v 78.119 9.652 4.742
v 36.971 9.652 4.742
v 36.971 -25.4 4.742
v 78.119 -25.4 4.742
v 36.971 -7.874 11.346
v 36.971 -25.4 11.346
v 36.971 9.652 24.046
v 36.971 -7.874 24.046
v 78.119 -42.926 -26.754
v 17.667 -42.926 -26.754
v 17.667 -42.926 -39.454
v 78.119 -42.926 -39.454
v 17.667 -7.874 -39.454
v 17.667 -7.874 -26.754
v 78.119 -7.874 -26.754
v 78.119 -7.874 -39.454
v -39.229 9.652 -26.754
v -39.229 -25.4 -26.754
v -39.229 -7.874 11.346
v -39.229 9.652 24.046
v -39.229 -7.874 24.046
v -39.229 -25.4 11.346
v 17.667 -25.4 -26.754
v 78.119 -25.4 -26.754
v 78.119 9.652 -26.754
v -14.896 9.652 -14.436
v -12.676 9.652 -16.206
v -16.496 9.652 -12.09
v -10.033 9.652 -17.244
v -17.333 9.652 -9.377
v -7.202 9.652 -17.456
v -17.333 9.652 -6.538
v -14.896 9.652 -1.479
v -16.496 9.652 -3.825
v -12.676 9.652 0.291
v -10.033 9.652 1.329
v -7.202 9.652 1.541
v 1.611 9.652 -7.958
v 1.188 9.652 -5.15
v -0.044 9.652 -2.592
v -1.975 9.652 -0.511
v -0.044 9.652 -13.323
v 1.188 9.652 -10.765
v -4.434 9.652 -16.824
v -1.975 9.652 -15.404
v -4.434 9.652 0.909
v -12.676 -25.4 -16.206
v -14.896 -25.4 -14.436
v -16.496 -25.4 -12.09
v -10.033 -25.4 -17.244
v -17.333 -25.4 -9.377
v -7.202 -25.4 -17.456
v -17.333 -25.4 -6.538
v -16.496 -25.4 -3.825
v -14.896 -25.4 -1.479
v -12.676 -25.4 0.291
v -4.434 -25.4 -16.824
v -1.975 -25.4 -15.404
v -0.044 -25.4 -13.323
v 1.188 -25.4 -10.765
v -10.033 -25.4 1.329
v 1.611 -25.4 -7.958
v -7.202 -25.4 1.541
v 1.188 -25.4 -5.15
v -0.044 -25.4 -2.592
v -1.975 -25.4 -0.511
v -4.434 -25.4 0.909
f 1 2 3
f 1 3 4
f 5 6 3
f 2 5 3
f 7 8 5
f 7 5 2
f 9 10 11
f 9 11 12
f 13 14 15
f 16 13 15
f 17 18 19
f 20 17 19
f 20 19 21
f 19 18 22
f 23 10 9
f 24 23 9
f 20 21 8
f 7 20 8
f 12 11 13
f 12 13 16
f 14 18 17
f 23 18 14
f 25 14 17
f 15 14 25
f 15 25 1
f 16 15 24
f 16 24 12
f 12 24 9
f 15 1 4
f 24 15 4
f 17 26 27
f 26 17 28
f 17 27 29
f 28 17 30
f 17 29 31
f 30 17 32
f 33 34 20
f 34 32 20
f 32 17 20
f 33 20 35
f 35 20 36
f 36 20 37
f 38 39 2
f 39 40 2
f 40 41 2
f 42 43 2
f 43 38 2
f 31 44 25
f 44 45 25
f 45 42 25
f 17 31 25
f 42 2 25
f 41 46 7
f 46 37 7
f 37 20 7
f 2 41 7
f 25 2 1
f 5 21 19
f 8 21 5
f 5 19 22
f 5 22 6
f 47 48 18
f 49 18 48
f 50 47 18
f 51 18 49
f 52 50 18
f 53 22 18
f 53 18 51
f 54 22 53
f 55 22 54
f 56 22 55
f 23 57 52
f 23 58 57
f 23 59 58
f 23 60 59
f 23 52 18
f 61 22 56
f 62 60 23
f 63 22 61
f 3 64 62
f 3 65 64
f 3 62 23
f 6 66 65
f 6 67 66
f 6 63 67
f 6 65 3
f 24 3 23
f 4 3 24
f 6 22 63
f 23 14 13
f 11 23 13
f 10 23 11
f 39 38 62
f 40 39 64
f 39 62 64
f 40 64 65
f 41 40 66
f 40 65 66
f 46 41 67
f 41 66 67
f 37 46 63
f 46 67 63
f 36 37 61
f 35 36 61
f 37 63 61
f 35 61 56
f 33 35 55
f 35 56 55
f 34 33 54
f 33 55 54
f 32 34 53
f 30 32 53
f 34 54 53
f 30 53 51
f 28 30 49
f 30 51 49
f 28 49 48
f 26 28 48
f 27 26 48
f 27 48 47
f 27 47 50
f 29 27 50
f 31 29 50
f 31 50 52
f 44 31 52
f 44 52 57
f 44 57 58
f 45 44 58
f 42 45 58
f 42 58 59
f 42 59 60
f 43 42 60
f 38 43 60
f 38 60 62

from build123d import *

# Parameters (mm, degrees)
F0_W      = 117.348
F0_H      = 50.8
F1_DEPTH  = 25.4
F3_DEPTH  = 9.652
F2_R      = 9.525
F4_DEPTH  = 35.053
F5_W      = 60.452
F5_H      = 35.052
F6_DEPTH  = 12.7
F7_W      = 76.2
F7_H      = 17.526
F8_DEPTH  = 12.7
F9_W      = 41.148
F9_H      = 35.052
F10_DEPTH = 19.304


with BuildPart() as f1:
    # F0 (on Front) → F1 (new body)
    with BuildSketch(Plane.XZ):
        with Locations((19.444794, -1.353553)):
            Rectangle(F0_W, F0_H)
    extrude(amount=F1_DEPTH)

    # F0 (on Front) → F3 (join)
    with BuildSketch(Plane.XZ):
        with Locations((19.444794, -1.353553)):
            Rectangle(F0_W, F0_H)
    extrude(amount=-F3_DEPTH)

    # F2 (on face) → F4 (cut, through all)
    with BuildSketch(Plane.XZ.offset(25.4)):
        with Locations((-7.913983, -7.957553)):
            Circle(F2_R)
    extrude(amount=-F4_DEPTH, mode=Mode.SUBTRACT)

    # F5 (on face) → F6 (join)
    with BuildSketch(Plane(origin=(0, 0, -26.753553), x_dir=(1, 0, 0), z_dir=(0, 0, -1))):
        with Locations((47.892794, 25.4)):
            Rectangle(F5_W, F5_H)
    extrude(amount=F6_DEPTH)

    # F7 (on face) → F8 (cut)
    with BuildSketch(Plane.XY.offset(24.046447)):
        with Locations((-1.129206, -16.637)):
            Rectangle(F7_W, F7_H)
    extrude(amount=-F8_DEPTH, mode=Mode.SUBTRACT)

    # F9 (on face) → F10 (cut)
    with BuildSketch(Plane.XY.offset(24.046447)):
        with Locations((57.544794, -7.874)):
            Rectangle(F9_W, F9_H)
    extrude(amount=-F10_DEPTH, mode=Mode.SUBTRACT)


solid = f1.part
